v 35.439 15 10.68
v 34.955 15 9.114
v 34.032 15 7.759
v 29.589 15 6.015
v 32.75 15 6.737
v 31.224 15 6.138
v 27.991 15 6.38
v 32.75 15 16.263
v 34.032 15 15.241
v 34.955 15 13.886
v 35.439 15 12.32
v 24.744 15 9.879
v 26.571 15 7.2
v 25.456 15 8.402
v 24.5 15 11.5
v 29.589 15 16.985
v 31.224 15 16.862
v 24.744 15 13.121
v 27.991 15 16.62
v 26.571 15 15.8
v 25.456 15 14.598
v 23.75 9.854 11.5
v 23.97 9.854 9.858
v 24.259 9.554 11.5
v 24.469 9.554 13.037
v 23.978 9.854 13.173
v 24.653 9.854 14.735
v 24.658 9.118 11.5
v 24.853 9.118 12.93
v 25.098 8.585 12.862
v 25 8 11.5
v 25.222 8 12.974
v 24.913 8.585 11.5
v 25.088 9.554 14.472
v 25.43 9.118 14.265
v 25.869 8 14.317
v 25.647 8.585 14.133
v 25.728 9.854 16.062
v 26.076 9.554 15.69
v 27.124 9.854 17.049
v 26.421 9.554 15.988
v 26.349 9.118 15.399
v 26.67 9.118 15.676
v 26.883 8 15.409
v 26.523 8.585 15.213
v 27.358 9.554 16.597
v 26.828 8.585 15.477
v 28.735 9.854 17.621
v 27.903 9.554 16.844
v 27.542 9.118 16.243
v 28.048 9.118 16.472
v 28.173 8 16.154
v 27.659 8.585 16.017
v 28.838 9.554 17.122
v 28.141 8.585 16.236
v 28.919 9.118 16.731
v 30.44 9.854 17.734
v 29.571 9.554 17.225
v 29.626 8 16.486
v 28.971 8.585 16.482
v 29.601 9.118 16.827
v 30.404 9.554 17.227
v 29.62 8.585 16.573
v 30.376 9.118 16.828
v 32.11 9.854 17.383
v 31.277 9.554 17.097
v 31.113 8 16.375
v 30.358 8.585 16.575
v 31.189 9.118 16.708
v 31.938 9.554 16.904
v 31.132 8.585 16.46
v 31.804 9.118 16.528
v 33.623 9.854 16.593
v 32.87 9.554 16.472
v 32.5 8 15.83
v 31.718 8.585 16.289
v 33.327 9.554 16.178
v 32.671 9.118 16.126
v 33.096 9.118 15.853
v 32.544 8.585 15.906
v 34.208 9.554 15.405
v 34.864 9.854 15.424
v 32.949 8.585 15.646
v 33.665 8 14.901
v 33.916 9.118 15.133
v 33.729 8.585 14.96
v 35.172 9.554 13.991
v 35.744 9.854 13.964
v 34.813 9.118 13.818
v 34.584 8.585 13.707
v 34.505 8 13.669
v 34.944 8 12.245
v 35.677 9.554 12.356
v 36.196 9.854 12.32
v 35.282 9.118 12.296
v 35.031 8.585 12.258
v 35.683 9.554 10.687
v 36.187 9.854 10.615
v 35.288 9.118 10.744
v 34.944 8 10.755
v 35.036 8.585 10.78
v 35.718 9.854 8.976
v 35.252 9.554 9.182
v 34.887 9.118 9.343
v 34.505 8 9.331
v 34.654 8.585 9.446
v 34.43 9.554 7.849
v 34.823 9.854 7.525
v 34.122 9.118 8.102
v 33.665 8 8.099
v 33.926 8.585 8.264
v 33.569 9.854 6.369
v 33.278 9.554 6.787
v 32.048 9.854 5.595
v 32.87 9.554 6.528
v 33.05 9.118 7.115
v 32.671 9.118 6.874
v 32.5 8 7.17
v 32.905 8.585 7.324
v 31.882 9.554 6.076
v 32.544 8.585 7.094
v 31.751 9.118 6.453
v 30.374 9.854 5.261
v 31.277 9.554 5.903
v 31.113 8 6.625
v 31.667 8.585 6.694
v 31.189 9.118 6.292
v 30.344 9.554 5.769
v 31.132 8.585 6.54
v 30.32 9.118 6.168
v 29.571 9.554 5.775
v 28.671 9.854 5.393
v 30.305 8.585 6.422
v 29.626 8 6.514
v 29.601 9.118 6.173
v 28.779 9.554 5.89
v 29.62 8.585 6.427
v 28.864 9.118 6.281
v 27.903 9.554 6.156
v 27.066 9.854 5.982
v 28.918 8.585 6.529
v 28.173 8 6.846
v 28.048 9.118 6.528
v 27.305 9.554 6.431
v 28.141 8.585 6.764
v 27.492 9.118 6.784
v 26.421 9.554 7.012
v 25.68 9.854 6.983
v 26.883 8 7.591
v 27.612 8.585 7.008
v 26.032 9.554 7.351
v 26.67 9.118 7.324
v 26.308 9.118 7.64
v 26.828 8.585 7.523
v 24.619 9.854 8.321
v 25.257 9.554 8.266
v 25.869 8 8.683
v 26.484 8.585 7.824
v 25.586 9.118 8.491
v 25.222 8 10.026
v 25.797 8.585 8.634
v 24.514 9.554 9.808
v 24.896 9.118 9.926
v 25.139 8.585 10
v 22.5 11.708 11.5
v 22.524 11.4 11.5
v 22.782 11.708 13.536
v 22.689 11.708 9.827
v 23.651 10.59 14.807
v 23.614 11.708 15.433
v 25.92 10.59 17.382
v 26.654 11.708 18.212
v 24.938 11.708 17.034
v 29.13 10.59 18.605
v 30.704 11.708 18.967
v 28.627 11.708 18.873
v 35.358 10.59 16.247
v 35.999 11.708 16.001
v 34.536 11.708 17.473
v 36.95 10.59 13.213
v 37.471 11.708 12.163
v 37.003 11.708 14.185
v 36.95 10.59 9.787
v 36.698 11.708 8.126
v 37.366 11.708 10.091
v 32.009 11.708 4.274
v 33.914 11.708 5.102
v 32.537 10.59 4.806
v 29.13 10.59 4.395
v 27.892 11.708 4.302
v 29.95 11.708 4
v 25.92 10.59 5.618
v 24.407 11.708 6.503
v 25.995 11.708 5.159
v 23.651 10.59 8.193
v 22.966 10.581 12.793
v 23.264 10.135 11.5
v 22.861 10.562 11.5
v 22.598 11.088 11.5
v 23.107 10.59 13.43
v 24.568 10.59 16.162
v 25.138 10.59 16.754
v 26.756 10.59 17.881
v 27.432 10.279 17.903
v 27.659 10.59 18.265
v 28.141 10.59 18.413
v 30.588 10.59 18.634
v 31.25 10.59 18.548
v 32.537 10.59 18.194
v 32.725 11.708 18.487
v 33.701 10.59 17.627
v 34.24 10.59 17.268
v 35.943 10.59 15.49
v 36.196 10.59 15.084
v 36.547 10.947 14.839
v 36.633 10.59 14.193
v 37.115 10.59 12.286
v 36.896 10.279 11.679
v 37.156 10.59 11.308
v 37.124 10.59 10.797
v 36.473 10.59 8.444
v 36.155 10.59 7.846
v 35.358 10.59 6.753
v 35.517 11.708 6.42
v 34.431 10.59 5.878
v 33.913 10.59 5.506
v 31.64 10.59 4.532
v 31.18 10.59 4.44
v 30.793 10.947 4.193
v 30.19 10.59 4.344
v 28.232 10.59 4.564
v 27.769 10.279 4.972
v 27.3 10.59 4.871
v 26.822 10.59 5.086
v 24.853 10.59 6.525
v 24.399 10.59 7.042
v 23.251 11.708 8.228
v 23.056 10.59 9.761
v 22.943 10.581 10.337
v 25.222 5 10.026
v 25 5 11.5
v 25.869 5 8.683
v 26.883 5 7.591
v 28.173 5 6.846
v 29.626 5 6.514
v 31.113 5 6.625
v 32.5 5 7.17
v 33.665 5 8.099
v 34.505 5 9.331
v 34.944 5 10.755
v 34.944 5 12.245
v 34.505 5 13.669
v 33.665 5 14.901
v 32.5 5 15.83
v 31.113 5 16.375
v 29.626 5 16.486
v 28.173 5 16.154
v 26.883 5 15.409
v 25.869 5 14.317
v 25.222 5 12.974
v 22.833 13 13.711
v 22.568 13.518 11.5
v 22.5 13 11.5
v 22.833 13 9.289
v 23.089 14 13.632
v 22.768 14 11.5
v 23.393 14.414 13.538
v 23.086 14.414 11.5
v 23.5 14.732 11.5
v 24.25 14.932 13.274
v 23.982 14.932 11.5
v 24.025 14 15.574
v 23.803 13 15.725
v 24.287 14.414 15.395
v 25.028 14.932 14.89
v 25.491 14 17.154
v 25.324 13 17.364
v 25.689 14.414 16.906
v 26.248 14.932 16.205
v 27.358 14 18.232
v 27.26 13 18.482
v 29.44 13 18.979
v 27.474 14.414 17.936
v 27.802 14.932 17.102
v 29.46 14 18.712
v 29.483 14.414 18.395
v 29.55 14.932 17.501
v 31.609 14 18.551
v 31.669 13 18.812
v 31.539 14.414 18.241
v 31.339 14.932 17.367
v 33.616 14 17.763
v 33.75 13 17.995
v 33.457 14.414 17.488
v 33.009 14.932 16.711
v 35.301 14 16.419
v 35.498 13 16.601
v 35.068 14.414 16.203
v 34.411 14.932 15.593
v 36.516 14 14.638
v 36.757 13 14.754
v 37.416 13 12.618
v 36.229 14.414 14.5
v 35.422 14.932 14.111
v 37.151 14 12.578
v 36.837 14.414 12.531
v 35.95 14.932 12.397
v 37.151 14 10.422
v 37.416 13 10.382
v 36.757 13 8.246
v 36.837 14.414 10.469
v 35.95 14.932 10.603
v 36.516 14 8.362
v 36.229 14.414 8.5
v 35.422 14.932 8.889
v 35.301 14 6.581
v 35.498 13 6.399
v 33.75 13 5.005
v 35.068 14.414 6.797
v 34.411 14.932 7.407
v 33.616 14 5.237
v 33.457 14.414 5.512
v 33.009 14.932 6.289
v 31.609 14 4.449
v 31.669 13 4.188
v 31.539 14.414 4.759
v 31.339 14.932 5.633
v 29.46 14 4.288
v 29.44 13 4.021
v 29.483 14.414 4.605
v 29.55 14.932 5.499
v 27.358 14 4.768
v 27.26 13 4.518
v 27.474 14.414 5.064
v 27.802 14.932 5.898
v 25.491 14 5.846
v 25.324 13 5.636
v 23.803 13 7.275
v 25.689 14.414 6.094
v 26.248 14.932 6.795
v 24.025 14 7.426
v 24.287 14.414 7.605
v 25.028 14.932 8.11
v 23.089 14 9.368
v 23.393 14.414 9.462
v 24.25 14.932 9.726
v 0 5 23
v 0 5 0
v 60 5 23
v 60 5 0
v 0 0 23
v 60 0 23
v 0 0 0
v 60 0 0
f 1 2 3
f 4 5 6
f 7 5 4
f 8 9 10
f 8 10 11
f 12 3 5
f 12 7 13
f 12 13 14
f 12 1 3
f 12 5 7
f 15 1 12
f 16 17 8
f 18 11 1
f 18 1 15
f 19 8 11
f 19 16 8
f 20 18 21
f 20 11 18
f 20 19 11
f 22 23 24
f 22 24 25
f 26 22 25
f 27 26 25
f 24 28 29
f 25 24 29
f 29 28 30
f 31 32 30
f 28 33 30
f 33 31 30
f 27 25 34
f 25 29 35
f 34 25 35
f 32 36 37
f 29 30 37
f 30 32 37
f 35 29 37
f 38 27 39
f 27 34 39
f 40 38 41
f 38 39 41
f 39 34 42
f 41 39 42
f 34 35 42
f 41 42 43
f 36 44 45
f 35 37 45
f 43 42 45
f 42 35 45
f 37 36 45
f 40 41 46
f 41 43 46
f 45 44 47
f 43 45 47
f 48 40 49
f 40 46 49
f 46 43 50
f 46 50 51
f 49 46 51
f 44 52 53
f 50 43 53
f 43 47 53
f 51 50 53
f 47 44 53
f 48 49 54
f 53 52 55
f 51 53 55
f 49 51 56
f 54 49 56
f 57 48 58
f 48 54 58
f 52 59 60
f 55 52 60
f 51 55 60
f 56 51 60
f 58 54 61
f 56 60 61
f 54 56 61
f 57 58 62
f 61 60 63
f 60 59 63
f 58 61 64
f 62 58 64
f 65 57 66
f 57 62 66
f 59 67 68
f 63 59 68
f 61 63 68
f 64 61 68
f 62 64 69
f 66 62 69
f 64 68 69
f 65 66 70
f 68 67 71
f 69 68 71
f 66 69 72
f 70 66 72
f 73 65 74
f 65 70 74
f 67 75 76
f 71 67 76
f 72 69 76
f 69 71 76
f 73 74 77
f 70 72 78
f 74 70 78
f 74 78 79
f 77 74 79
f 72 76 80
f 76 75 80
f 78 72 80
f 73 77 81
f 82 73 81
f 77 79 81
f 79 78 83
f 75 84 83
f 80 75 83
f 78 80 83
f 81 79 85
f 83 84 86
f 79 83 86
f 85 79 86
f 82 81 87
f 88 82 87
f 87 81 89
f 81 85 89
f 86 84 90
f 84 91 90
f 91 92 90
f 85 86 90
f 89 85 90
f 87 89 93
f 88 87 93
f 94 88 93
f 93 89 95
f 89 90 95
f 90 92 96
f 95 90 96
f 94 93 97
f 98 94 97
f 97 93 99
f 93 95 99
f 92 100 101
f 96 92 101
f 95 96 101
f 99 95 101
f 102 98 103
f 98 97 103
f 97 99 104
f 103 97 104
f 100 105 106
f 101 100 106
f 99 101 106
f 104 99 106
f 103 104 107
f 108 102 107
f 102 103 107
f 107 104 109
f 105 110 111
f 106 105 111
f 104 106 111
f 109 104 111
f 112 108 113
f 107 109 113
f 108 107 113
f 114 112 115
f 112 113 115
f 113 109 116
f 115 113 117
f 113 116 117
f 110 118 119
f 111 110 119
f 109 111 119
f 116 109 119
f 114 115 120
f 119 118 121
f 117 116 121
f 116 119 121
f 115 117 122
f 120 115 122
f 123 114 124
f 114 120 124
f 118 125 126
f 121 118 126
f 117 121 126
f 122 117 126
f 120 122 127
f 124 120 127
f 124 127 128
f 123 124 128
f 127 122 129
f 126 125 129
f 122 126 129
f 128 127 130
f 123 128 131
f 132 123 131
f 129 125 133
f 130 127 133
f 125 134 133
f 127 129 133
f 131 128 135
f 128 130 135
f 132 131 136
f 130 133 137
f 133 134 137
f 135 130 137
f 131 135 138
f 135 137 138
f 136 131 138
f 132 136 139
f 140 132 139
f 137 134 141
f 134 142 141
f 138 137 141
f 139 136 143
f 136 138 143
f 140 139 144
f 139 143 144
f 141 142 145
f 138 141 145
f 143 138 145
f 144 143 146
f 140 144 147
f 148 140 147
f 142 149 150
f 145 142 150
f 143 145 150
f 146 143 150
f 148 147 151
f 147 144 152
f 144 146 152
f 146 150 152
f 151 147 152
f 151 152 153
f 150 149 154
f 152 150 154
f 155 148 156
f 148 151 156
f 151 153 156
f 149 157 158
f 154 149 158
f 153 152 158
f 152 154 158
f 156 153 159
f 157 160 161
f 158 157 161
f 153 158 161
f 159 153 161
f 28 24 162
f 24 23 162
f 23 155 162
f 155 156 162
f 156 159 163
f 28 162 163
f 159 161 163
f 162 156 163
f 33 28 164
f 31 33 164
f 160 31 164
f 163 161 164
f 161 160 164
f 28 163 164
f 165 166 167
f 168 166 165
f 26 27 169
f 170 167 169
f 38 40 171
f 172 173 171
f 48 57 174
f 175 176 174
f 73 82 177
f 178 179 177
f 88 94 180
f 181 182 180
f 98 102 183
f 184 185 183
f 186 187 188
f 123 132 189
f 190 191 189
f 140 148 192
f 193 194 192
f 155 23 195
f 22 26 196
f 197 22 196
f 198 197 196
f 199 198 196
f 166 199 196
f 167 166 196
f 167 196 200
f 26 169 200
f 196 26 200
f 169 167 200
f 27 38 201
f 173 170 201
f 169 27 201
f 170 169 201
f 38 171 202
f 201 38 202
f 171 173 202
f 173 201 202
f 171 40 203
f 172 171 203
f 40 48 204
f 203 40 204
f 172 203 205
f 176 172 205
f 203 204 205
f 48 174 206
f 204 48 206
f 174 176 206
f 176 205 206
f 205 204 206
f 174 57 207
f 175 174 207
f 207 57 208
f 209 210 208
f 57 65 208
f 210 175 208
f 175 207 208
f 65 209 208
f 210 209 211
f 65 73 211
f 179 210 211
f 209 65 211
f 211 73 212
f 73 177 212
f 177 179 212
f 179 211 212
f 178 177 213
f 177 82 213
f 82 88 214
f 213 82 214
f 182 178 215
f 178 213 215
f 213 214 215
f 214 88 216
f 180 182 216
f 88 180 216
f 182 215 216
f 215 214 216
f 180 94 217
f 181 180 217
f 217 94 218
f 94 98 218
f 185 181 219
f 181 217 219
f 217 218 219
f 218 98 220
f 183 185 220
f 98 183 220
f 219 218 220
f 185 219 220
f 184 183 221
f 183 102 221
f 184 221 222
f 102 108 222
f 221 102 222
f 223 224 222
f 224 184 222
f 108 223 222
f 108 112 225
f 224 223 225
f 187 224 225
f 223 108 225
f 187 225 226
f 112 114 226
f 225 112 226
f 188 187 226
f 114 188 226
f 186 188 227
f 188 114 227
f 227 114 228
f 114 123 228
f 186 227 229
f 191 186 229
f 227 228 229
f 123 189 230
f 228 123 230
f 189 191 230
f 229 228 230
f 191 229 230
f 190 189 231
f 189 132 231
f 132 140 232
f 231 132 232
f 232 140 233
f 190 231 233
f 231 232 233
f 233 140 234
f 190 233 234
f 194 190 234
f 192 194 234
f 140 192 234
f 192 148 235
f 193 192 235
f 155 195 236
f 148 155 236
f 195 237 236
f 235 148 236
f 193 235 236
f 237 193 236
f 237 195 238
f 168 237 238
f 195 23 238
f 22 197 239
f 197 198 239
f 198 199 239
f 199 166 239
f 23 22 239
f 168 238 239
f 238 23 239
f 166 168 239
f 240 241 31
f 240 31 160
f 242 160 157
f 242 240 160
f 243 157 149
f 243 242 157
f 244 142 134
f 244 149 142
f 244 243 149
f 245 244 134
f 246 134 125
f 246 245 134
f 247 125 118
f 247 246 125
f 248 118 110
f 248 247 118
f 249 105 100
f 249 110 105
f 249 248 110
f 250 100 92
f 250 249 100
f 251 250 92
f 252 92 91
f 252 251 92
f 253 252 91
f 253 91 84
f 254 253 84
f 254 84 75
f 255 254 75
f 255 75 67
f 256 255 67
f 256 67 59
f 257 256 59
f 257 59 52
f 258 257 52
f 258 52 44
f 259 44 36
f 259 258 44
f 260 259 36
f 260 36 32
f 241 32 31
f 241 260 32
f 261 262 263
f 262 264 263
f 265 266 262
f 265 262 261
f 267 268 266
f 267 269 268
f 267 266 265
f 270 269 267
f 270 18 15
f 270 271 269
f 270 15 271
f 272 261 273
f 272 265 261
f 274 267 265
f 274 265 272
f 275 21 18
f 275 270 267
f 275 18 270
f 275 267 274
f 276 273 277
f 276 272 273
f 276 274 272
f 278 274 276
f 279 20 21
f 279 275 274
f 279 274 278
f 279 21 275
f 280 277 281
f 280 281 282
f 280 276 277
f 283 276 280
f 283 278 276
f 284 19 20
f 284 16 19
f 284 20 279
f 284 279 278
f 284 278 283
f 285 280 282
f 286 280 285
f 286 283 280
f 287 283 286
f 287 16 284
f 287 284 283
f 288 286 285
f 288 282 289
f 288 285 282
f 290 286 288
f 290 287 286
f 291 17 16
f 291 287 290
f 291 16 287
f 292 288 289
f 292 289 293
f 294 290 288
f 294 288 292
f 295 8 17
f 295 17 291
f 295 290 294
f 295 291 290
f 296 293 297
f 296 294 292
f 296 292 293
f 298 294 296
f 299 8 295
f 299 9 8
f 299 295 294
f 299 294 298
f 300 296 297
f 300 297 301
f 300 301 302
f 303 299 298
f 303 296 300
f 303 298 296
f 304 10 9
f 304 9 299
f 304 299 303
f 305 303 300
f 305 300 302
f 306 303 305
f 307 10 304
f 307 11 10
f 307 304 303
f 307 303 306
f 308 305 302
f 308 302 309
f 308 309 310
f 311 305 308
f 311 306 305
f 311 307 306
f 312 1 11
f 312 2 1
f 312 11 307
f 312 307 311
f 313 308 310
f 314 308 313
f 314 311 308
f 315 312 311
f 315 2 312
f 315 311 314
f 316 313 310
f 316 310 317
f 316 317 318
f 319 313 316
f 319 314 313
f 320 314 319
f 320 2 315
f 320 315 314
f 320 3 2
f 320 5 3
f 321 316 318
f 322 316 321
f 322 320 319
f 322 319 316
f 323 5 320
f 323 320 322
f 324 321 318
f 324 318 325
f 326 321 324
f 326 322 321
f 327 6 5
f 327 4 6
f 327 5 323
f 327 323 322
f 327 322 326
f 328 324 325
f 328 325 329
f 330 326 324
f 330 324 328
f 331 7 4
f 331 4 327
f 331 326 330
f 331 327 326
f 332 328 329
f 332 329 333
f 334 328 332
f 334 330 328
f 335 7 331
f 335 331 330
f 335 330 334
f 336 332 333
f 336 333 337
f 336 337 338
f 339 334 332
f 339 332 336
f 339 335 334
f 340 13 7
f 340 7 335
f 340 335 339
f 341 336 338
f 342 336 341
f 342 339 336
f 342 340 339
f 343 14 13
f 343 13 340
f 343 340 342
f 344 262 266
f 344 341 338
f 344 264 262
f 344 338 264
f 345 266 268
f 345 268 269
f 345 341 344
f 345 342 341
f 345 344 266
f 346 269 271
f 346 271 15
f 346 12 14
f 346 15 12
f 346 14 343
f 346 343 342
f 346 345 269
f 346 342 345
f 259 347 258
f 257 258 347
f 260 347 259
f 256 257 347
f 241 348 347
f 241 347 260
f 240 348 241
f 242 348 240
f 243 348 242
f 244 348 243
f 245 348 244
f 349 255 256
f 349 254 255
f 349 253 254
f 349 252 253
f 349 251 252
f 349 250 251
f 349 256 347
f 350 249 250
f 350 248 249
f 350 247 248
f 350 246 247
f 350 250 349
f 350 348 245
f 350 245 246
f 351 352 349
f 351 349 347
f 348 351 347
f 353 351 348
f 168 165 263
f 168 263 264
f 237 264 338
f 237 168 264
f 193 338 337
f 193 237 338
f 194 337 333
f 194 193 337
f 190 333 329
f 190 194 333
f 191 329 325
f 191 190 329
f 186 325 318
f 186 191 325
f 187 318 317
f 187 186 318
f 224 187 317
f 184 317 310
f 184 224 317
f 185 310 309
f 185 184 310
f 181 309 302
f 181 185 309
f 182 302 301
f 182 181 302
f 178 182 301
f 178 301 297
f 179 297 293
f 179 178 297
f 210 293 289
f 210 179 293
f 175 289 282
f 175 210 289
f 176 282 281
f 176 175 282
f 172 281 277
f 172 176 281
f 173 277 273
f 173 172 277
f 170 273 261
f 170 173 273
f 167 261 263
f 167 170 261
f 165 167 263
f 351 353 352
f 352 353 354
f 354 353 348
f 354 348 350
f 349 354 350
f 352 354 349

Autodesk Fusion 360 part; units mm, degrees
sketch "Sketch1" plane through (0, 0, 0) normal (0, 1, 0) x (1, 0, 0)
  line L0 (0, 0) -> (60, 0)
  line L1 (60, 0) -> (60, -23)
  line L2 (60, -23) -> (0, -23)
  line L3 (0, -23) -> (0, 0)
  dimension "d1" = 60
  dimension "d2" = 23
extrude "Extrude1" add sketch "Sketch1" along normal blind 5
sketch "Sketch2" plane through (0, 5, 0) normal (0, 1, 0) x (-1, 0, 0)
  line L0 (0, 23) -> (-60, 23)
  line L1 (-60, 23) -> (-60, 0)
  line L2 (-60, 0) -> (0, 0)
  line L3 (0, 0) -> (0, 23)
  circle A0 centre (-30, 11.5) radius 5
  dimension "d5" = 10
extrude "Extrude2" add sketch "Sketch2" along normal blind 5 contours A0
sketch "Sketch3" plane through (0, 10, 0) normal (0, 1, 0) x (-1, 0, 0)
  circle A0 centre (-30, 11.5) radius 5
  circle A1 centre (-30, 11.5) radius 7.5
  dimension "d8" = 15
extrude "Extrude3" add sketch "Sketch3" along normal blind 5 contours A0 | A1
fillet "Fillet1" radius 2 1 edges at (34.6616, 10, 9.6919)
fillet "Fillet2" radius 2 2 edges at (36.9925, 10, 8.7879) (36.9925, 15, 8.7879)
